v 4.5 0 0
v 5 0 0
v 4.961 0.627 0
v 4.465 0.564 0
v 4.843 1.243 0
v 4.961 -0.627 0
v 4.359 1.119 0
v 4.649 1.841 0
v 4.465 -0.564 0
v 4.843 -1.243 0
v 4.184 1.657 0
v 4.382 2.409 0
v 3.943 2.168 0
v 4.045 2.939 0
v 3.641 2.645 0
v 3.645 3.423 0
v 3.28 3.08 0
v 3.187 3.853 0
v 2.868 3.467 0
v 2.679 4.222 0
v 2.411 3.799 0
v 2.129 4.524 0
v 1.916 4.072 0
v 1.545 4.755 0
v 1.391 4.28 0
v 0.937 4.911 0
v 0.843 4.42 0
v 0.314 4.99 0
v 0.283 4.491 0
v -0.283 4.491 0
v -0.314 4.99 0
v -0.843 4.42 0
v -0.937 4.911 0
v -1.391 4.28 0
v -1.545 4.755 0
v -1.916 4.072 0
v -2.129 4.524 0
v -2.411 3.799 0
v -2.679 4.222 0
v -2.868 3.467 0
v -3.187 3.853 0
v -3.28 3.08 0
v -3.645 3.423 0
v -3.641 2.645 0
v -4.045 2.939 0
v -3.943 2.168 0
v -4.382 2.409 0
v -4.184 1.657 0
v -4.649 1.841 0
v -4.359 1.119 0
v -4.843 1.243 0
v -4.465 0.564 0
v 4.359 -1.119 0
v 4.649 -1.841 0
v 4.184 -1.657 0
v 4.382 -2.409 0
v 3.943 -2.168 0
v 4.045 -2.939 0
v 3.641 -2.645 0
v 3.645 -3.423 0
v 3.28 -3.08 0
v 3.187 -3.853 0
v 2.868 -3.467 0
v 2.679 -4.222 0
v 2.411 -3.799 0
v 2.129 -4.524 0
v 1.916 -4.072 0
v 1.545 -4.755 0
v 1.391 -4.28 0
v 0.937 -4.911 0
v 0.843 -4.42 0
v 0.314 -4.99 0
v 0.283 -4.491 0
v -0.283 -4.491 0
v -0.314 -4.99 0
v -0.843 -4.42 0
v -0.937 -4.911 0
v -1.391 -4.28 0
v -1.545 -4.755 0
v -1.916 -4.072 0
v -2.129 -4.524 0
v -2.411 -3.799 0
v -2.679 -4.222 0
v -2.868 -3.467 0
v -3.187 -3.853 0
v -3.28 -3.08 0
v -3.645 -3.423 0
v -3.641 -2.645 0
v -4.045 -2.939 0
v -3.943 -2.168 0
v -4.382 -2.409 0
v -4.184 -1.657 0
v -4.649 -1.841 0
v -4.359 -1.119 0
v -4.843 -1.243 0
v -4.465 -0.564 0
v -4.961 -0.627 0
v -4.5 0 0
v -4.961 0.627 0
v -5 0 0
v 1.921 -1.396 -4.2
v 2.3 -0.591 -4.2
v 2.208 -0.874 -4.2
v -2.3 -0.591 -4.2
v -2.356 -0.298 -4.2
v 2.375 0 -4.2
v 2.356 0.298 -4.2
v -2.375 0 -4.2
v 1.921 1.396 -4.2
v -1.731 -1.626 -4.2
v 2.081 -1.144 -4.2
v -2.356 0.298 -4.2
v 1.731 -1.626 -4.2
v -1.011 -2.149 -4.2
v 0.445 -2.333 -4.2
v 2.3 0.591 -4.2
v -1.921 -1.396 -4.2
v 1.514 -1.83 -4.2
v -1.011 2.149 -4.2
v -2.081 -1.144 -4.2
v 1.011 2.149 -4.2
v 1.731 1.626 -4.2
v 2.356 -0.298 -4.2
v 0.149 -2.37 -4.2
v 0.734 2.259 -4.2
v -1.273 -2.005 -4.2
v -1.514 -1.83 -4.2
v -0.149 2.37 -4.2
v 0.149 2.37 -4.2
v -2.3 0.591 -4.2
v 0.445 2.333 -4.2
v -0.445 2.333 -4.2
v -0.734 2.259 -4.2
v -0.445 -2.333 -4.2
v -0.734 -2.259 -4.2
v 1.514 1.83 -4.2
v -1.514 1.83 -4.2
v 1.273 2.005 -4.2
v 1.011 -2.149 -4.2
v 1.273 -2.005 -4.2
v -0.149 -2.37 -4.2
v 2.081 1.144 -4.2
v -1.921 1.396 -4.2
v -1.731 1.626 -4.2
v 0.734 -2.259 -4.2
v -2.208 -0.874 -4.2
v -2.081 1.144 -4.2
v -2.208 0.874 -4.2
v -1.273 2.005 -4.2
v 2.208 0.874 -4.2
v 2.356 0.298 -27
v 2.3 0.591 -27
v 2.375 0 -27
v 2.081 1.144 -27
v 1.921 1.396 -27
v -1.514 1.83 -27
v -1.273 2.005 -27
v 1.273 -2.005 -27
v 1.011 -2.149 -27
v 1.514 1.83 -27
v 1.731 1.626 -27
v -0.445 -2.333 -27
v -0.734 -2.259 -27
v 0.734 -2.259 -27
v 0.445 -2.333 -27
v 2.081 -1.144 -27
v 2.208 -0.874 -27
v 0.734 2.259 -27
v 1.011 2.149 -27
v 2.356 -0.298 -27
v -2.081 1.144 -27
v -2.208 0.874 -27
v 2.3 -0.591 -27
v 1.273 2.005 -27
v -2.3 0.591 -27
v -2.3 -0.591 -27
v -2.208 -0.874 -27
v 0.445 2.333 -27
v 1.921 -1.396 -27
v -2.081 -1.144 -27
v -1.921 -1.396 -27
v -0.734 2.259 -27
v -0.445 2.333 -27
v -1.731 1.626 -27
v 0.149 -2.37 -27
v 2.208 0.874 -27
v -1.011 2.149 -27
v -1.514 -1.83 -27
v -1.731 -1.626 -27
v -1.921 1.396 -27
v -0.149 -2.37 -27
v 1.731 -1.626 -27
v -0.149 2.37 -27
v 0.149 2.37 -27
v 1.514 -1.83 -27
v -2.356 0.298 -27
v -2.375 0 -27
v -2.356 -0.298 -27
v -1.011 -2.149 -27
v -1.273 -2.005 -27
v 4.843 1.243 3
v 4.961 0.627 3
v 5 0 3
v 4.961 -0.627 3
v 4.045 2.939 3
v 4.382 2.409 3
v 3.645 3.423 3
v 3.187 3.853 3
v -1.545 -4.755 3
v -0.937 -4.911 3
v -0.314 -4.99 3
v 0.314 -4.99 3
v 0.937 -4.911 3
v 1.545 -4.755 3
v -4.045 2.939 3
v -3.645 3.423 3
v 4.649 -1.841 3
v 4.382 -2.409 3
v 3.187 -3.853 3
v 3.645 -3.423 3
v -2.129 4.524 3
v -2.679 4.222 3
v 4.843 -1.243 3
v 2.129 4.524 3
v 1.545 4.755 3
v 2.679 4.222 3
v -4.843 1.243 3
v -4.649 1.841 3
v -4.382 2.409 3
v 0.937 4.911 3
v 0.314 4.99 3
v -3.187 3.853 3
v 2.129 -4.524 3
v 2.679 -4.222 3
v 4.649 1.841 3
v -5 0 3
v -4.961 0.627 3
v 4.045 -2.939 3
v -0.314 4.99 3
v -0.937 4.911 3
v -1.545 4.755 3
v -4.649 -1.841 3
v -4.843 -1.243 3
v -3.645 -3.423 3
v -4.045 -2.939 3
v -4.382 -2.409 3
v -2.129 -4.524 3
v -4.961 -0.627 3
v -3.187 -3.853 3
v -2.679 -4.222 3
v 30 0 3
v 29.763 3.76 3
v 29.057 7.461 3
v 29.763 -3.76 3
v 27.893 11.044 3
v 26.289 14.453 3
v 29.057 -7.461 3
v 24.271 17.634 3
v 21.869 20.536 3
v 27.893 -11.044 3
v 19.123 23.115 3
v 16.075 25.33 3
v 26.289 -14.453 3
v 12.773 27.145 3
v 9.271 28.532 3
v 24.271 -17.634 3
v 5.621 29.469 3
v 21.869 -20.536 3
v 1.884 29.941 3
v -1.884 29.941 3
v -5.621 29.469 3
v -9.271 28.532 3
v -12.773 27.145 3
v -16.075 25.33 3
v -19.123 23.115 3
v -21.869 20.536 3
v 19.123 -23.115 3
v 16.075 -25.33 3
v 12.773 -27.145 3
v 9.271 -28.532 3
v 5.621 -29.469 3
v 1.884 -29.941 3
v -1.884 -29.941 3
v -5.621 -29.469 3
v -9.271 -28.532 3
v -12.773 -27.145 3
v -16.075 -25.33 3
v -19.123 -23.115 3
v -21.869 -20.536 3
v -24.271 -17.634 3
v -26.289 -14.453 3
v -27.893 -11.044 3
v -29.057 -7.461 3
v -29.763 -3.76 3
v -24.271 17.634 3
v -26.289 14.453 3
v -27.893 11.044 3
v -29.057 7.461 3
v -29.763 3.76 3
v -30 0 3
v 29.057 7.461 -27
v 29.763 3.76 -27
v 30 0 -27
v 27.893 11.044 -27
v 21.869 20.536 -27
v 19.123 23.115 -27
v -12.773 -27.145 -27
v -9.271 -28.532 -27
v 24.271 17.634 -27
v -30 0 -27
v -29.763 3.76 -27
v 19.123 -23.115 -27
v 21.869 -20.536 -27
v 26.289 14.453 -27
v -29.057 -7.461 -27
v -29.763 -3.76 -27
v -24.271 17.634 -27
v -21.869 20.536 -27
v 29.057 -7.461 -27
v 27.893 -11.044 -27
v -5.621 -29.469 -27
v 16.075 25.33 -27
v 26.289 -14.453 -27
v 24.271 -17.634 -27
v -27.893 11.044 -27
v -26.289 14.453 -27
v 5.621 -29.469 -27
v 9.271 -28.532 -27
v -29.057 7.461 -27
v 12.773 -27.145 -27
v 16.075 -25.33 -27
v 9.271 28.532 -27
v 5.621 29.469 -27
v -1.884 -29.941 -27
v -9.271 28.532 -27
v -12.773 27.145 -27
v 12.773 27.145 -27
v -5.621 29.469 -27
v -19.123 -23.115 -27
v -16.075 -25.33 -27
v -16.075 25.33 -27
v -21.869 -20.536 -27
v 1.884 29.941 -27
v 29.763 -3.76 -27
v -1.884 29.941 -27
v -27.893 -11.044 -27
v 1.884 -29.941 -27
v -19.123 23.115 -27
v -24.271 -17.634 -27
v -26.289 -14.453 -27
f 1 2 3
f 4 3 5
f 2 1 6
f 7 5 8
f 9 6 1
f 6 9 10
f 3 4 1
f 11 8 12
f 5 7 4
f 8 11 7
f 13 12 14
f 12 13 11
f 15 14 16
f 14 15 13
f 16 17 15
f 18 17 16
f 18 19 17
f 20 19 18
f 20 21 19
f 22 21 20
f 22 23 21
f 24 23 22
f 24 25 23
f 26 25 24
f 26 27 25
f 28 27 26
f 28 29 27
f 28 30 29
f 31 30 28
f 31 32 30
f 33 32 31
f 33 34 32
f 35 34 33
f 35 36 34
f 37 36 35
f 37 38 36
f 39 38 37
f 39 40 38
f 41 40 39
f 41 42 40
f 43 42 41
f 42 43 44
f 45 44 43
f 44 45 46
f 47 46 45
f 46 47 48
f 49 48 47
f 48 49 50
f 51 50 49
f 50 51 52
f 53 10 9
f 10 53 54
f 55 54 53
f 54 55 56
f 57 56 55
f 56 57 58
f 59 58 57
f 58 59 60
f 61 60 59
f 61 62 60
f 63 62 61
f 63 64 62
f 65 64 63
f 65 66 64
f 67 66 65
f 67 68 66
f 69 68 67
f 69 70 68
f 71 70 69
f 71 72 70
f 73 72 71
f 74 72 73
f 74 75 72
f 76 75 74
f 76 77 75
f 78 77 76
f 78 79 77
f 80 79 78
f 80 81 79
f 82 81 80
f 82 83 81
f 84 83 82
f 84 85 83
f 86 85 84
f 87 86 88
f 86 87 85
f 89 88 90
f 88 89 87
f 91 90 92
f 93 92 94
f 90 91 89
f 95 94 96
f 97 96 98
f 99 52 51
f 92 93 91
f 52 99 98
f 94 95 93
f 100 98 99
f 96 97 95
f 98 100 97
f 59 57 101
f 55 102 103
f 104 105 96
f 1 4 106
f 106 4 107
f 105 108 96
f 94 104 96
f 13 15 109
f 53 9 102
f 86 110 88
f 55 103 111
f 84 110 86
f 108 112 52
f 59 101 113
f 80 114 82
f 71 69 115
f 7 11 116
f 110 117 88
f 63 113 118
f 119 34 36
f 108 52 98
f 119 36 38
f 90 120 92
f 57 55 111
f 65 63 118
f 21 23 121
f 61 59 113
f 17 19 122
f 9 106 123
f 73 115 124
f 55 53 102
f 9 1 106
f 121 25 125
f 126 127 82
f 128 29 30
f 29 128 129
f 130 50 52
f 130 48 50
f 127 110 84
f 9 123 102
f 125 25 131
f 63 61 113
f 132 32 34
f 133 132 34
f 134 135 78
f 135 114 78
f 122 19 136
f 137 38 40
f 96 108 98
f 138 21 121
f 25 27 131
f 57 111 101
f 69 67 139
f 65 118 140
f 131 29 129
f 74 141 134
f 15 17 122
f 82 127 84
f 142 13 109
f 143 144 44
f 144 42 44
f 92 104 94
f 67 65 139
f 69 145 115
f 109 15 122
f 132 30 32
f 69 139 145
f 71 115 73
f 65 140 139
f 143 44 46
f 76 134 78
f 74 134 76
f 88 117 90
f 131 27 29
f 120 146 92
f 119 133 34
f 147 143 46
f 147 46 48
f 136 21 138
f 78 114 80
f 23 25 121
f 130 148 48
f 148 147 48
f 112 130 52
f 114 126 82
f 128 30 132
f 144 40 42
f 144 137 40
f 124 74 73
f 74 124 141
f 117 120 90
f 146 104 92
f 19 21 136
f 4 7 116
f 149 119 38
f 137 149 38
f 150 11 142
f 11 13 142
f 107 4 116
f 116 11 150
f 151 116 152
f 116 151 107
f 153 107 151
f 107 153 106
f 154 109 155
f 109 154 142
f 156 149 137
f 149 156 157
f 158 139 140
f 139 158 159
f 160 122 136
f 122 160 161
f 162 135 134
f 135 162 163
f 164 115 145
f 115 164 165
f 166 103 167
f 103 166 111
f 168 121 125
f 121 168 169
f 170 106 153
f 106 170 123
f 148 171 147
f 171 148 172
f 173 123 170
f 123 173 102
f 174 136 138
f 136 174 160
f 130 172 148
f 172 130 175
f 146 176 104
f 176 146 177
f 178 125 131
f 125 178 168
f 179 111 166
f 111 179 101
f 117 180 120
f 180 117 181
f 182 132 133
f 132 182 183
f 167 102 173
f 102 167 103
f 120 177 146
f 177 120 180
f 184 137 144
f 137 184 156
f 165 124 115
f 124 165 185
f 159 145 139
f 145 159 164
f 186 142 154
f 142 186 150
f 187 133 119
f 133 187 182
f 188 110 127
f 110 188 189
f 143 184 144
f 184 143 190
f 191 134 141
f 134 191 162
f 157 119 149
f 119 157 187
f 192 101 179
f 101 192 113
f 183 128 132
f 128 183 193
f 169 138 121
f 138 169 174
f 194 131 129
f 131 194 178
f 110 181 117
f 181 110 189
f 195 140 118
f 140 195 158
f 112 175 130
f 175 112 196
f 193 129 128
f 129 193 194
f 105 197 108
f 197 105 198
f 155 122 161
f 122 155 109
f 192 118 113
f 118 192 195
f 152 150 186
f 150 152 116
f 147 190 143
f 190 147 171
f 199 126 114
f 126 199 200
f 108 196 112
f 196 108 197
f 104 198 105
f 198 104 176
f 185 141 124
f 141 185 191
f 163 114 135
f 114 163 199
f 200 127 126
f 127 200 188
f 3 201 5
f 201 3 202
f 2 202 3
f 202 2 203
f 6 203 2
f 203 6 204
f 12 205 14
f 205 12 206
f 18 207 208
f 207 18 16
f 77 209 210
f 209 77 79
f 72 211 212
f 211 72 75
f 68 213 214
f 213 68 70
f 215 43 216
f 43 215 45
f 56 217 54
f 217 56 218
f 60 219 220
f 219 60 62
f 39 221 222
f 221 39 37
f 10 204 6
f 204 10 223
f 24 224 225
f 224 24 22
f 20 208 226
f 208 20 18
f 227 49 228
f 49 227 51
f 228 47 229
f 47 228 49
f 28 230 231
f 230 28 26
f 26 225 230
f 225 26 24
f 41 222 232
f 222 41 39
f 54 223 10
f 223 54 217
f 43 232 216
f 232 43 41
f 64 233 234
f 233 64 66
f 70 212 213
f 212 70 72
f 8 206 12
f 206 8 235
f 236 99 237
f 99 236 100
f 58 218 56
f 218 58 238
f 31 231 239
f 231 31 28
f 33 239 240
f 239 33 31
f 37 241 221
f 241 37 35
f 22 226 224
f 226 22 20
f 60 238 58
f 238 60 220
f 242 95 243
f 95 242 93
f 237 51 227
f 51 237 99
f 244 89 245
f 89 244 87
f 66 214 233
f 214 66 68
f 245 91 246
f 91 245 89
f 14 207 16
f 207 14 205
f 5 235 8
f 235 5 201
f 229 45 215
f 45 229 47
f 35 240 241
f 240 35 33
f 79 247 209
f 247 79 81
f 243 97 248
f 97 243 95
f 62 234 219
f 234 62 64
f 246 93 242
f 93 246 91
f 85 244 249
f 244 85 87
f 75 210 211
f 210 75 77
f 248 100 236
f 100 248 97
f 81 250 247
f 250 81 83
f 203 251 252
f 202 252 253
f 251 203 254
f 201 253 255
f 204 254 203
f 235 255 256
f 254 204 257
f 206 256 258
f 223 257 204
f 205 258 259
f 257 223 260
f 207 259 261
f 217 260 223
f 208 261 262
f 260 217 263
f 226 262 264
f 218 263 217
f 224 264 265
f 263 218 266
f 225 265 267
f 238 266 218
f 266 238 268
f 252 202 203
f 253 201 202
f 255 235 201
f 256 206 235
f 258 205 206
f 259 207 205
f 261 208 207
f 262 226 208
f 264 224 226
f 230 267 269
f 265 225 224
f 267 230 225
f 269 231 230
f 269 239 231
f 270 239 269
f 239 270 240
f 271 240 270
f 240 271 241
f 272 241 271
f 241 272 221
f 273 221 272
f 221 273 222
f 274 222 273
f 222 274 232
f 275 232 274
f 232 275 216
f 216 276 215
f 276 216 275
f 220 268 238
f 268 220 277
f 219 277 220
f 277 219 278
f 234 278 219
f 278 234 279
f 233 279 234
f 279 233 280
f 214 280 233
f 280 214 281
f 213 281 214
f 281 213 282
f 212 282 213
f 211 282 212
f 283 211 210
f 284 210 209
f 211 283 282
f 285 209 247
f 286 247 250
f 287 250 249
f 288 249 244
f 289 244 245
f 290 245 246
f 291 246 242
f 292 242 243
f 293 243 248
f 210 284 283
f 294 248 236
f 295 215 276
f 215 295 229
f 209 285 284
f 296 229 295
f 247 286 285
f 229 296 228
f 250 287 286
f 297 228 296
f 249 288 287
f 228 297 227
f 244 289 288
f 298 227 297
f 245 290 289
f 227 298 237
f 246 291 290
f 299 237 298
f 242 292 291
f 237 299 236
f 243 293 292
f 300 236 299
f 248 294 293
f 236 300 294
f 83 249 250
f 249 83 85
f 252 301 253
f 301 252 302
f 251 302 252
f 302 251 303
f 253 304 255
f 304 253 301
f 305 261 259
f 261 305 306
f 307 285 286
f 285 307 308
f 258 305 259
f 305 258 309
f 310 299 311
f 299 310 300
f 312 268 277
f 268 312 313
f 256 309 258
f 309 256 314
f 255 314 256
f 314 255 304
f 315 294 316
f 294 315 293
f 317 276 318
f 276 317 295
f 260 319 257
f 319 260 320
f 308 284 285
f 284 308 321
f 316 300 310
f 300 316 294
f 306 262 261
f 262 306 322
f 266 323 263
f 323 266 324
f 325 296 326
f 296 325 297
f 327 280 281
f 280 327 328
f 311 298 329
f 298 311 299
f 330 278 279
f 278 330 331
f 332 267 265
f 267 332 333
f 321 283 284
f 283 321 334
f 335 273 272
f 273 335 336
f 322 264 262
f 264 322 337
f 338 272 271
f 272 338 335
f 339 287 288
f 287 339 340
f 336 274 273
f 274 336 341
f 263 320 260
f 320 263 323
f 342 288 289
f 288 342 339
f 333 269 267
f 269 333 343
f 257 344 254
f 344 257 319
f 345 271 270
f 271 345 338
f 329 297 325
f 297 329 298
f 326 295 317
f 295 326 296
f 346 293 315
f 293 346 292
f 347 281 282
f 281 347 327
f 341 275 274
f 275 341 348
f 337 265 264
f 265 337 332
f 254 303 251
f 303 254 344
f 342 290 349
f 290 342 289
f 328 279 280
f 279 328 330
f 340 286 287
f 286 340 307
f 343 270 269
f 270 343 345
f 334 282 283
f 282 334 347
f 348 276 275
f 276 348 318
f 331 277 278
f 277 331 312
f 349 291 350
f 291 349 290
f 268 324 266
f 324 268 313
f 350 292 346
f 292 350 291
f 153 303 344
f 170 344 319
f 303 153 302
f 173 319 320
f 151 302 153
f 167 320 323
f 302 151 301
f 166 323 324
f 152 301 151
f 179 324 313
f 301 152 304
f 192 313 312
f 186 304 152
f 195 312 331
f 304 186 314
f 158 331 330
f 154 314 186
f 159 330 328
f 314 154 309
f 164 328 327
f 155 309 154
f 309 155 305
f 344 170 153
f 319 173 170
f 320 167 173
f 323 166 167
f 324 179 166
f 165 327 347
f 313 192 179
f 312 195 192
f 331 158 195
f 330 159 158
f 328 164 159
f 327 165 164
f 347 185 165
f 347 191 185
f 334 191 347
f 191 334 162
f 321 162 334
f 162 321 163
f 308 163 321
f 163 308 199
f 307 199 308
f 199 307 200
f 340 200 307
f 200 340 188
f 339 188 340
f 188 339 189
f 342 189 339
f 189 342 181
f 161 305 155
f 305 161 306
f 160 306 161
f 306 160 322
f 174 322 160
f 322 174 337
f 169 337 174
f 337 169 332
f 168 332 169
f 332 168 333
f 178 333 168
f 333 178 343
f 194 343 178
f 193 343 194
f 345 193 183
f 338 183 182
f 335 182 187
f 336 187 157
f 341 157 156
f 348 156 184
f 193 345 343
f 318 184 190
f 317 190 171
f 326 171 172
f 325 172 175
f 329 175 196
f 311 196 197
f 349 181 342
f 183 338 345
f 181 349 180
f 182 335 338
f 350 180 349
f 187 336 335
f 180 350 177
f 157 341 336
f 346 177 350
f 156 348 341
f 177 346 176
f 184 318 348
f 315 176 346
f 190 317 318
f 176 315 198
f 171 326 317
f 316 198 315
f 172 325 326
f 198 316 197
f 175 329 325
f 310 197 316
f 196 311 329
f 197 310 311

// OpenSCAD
$fn = 50;


difference() {
	union() {
		translate(v = [0, 0, -27.0000000000]) {
			cylinder(h = 30, r = 30.0000000000);
		}
	}
	union() {
		translate(v = [0, 0, 0]) {
			rotate(a = [0, 0, 0]) {
				difference() {
					union() {
						translate(v = [0, 0, -30.0000000000]) {
							cylinder(h = 30, r = 2.2500000000);
						}
						translate(v = [0, 0, -4.2000000000]) {
							cylinder(h = 4.2000000000, r1 = 2.3750000000, r2 = 4.5000000000);
						}
						translate(v = [0, 0, -30.0000000000]) {
							cylinder(h = 30, r = 2.3750000000);
						}
						translate(v = [0, 0, -30.0000000000]) {
							cylinder(h = 30, r = 2.2500000000);
						}
					}
					union();
				}
			}
		}
		#cylinder(h = 3, r = 5.0000000000);
	}
}
